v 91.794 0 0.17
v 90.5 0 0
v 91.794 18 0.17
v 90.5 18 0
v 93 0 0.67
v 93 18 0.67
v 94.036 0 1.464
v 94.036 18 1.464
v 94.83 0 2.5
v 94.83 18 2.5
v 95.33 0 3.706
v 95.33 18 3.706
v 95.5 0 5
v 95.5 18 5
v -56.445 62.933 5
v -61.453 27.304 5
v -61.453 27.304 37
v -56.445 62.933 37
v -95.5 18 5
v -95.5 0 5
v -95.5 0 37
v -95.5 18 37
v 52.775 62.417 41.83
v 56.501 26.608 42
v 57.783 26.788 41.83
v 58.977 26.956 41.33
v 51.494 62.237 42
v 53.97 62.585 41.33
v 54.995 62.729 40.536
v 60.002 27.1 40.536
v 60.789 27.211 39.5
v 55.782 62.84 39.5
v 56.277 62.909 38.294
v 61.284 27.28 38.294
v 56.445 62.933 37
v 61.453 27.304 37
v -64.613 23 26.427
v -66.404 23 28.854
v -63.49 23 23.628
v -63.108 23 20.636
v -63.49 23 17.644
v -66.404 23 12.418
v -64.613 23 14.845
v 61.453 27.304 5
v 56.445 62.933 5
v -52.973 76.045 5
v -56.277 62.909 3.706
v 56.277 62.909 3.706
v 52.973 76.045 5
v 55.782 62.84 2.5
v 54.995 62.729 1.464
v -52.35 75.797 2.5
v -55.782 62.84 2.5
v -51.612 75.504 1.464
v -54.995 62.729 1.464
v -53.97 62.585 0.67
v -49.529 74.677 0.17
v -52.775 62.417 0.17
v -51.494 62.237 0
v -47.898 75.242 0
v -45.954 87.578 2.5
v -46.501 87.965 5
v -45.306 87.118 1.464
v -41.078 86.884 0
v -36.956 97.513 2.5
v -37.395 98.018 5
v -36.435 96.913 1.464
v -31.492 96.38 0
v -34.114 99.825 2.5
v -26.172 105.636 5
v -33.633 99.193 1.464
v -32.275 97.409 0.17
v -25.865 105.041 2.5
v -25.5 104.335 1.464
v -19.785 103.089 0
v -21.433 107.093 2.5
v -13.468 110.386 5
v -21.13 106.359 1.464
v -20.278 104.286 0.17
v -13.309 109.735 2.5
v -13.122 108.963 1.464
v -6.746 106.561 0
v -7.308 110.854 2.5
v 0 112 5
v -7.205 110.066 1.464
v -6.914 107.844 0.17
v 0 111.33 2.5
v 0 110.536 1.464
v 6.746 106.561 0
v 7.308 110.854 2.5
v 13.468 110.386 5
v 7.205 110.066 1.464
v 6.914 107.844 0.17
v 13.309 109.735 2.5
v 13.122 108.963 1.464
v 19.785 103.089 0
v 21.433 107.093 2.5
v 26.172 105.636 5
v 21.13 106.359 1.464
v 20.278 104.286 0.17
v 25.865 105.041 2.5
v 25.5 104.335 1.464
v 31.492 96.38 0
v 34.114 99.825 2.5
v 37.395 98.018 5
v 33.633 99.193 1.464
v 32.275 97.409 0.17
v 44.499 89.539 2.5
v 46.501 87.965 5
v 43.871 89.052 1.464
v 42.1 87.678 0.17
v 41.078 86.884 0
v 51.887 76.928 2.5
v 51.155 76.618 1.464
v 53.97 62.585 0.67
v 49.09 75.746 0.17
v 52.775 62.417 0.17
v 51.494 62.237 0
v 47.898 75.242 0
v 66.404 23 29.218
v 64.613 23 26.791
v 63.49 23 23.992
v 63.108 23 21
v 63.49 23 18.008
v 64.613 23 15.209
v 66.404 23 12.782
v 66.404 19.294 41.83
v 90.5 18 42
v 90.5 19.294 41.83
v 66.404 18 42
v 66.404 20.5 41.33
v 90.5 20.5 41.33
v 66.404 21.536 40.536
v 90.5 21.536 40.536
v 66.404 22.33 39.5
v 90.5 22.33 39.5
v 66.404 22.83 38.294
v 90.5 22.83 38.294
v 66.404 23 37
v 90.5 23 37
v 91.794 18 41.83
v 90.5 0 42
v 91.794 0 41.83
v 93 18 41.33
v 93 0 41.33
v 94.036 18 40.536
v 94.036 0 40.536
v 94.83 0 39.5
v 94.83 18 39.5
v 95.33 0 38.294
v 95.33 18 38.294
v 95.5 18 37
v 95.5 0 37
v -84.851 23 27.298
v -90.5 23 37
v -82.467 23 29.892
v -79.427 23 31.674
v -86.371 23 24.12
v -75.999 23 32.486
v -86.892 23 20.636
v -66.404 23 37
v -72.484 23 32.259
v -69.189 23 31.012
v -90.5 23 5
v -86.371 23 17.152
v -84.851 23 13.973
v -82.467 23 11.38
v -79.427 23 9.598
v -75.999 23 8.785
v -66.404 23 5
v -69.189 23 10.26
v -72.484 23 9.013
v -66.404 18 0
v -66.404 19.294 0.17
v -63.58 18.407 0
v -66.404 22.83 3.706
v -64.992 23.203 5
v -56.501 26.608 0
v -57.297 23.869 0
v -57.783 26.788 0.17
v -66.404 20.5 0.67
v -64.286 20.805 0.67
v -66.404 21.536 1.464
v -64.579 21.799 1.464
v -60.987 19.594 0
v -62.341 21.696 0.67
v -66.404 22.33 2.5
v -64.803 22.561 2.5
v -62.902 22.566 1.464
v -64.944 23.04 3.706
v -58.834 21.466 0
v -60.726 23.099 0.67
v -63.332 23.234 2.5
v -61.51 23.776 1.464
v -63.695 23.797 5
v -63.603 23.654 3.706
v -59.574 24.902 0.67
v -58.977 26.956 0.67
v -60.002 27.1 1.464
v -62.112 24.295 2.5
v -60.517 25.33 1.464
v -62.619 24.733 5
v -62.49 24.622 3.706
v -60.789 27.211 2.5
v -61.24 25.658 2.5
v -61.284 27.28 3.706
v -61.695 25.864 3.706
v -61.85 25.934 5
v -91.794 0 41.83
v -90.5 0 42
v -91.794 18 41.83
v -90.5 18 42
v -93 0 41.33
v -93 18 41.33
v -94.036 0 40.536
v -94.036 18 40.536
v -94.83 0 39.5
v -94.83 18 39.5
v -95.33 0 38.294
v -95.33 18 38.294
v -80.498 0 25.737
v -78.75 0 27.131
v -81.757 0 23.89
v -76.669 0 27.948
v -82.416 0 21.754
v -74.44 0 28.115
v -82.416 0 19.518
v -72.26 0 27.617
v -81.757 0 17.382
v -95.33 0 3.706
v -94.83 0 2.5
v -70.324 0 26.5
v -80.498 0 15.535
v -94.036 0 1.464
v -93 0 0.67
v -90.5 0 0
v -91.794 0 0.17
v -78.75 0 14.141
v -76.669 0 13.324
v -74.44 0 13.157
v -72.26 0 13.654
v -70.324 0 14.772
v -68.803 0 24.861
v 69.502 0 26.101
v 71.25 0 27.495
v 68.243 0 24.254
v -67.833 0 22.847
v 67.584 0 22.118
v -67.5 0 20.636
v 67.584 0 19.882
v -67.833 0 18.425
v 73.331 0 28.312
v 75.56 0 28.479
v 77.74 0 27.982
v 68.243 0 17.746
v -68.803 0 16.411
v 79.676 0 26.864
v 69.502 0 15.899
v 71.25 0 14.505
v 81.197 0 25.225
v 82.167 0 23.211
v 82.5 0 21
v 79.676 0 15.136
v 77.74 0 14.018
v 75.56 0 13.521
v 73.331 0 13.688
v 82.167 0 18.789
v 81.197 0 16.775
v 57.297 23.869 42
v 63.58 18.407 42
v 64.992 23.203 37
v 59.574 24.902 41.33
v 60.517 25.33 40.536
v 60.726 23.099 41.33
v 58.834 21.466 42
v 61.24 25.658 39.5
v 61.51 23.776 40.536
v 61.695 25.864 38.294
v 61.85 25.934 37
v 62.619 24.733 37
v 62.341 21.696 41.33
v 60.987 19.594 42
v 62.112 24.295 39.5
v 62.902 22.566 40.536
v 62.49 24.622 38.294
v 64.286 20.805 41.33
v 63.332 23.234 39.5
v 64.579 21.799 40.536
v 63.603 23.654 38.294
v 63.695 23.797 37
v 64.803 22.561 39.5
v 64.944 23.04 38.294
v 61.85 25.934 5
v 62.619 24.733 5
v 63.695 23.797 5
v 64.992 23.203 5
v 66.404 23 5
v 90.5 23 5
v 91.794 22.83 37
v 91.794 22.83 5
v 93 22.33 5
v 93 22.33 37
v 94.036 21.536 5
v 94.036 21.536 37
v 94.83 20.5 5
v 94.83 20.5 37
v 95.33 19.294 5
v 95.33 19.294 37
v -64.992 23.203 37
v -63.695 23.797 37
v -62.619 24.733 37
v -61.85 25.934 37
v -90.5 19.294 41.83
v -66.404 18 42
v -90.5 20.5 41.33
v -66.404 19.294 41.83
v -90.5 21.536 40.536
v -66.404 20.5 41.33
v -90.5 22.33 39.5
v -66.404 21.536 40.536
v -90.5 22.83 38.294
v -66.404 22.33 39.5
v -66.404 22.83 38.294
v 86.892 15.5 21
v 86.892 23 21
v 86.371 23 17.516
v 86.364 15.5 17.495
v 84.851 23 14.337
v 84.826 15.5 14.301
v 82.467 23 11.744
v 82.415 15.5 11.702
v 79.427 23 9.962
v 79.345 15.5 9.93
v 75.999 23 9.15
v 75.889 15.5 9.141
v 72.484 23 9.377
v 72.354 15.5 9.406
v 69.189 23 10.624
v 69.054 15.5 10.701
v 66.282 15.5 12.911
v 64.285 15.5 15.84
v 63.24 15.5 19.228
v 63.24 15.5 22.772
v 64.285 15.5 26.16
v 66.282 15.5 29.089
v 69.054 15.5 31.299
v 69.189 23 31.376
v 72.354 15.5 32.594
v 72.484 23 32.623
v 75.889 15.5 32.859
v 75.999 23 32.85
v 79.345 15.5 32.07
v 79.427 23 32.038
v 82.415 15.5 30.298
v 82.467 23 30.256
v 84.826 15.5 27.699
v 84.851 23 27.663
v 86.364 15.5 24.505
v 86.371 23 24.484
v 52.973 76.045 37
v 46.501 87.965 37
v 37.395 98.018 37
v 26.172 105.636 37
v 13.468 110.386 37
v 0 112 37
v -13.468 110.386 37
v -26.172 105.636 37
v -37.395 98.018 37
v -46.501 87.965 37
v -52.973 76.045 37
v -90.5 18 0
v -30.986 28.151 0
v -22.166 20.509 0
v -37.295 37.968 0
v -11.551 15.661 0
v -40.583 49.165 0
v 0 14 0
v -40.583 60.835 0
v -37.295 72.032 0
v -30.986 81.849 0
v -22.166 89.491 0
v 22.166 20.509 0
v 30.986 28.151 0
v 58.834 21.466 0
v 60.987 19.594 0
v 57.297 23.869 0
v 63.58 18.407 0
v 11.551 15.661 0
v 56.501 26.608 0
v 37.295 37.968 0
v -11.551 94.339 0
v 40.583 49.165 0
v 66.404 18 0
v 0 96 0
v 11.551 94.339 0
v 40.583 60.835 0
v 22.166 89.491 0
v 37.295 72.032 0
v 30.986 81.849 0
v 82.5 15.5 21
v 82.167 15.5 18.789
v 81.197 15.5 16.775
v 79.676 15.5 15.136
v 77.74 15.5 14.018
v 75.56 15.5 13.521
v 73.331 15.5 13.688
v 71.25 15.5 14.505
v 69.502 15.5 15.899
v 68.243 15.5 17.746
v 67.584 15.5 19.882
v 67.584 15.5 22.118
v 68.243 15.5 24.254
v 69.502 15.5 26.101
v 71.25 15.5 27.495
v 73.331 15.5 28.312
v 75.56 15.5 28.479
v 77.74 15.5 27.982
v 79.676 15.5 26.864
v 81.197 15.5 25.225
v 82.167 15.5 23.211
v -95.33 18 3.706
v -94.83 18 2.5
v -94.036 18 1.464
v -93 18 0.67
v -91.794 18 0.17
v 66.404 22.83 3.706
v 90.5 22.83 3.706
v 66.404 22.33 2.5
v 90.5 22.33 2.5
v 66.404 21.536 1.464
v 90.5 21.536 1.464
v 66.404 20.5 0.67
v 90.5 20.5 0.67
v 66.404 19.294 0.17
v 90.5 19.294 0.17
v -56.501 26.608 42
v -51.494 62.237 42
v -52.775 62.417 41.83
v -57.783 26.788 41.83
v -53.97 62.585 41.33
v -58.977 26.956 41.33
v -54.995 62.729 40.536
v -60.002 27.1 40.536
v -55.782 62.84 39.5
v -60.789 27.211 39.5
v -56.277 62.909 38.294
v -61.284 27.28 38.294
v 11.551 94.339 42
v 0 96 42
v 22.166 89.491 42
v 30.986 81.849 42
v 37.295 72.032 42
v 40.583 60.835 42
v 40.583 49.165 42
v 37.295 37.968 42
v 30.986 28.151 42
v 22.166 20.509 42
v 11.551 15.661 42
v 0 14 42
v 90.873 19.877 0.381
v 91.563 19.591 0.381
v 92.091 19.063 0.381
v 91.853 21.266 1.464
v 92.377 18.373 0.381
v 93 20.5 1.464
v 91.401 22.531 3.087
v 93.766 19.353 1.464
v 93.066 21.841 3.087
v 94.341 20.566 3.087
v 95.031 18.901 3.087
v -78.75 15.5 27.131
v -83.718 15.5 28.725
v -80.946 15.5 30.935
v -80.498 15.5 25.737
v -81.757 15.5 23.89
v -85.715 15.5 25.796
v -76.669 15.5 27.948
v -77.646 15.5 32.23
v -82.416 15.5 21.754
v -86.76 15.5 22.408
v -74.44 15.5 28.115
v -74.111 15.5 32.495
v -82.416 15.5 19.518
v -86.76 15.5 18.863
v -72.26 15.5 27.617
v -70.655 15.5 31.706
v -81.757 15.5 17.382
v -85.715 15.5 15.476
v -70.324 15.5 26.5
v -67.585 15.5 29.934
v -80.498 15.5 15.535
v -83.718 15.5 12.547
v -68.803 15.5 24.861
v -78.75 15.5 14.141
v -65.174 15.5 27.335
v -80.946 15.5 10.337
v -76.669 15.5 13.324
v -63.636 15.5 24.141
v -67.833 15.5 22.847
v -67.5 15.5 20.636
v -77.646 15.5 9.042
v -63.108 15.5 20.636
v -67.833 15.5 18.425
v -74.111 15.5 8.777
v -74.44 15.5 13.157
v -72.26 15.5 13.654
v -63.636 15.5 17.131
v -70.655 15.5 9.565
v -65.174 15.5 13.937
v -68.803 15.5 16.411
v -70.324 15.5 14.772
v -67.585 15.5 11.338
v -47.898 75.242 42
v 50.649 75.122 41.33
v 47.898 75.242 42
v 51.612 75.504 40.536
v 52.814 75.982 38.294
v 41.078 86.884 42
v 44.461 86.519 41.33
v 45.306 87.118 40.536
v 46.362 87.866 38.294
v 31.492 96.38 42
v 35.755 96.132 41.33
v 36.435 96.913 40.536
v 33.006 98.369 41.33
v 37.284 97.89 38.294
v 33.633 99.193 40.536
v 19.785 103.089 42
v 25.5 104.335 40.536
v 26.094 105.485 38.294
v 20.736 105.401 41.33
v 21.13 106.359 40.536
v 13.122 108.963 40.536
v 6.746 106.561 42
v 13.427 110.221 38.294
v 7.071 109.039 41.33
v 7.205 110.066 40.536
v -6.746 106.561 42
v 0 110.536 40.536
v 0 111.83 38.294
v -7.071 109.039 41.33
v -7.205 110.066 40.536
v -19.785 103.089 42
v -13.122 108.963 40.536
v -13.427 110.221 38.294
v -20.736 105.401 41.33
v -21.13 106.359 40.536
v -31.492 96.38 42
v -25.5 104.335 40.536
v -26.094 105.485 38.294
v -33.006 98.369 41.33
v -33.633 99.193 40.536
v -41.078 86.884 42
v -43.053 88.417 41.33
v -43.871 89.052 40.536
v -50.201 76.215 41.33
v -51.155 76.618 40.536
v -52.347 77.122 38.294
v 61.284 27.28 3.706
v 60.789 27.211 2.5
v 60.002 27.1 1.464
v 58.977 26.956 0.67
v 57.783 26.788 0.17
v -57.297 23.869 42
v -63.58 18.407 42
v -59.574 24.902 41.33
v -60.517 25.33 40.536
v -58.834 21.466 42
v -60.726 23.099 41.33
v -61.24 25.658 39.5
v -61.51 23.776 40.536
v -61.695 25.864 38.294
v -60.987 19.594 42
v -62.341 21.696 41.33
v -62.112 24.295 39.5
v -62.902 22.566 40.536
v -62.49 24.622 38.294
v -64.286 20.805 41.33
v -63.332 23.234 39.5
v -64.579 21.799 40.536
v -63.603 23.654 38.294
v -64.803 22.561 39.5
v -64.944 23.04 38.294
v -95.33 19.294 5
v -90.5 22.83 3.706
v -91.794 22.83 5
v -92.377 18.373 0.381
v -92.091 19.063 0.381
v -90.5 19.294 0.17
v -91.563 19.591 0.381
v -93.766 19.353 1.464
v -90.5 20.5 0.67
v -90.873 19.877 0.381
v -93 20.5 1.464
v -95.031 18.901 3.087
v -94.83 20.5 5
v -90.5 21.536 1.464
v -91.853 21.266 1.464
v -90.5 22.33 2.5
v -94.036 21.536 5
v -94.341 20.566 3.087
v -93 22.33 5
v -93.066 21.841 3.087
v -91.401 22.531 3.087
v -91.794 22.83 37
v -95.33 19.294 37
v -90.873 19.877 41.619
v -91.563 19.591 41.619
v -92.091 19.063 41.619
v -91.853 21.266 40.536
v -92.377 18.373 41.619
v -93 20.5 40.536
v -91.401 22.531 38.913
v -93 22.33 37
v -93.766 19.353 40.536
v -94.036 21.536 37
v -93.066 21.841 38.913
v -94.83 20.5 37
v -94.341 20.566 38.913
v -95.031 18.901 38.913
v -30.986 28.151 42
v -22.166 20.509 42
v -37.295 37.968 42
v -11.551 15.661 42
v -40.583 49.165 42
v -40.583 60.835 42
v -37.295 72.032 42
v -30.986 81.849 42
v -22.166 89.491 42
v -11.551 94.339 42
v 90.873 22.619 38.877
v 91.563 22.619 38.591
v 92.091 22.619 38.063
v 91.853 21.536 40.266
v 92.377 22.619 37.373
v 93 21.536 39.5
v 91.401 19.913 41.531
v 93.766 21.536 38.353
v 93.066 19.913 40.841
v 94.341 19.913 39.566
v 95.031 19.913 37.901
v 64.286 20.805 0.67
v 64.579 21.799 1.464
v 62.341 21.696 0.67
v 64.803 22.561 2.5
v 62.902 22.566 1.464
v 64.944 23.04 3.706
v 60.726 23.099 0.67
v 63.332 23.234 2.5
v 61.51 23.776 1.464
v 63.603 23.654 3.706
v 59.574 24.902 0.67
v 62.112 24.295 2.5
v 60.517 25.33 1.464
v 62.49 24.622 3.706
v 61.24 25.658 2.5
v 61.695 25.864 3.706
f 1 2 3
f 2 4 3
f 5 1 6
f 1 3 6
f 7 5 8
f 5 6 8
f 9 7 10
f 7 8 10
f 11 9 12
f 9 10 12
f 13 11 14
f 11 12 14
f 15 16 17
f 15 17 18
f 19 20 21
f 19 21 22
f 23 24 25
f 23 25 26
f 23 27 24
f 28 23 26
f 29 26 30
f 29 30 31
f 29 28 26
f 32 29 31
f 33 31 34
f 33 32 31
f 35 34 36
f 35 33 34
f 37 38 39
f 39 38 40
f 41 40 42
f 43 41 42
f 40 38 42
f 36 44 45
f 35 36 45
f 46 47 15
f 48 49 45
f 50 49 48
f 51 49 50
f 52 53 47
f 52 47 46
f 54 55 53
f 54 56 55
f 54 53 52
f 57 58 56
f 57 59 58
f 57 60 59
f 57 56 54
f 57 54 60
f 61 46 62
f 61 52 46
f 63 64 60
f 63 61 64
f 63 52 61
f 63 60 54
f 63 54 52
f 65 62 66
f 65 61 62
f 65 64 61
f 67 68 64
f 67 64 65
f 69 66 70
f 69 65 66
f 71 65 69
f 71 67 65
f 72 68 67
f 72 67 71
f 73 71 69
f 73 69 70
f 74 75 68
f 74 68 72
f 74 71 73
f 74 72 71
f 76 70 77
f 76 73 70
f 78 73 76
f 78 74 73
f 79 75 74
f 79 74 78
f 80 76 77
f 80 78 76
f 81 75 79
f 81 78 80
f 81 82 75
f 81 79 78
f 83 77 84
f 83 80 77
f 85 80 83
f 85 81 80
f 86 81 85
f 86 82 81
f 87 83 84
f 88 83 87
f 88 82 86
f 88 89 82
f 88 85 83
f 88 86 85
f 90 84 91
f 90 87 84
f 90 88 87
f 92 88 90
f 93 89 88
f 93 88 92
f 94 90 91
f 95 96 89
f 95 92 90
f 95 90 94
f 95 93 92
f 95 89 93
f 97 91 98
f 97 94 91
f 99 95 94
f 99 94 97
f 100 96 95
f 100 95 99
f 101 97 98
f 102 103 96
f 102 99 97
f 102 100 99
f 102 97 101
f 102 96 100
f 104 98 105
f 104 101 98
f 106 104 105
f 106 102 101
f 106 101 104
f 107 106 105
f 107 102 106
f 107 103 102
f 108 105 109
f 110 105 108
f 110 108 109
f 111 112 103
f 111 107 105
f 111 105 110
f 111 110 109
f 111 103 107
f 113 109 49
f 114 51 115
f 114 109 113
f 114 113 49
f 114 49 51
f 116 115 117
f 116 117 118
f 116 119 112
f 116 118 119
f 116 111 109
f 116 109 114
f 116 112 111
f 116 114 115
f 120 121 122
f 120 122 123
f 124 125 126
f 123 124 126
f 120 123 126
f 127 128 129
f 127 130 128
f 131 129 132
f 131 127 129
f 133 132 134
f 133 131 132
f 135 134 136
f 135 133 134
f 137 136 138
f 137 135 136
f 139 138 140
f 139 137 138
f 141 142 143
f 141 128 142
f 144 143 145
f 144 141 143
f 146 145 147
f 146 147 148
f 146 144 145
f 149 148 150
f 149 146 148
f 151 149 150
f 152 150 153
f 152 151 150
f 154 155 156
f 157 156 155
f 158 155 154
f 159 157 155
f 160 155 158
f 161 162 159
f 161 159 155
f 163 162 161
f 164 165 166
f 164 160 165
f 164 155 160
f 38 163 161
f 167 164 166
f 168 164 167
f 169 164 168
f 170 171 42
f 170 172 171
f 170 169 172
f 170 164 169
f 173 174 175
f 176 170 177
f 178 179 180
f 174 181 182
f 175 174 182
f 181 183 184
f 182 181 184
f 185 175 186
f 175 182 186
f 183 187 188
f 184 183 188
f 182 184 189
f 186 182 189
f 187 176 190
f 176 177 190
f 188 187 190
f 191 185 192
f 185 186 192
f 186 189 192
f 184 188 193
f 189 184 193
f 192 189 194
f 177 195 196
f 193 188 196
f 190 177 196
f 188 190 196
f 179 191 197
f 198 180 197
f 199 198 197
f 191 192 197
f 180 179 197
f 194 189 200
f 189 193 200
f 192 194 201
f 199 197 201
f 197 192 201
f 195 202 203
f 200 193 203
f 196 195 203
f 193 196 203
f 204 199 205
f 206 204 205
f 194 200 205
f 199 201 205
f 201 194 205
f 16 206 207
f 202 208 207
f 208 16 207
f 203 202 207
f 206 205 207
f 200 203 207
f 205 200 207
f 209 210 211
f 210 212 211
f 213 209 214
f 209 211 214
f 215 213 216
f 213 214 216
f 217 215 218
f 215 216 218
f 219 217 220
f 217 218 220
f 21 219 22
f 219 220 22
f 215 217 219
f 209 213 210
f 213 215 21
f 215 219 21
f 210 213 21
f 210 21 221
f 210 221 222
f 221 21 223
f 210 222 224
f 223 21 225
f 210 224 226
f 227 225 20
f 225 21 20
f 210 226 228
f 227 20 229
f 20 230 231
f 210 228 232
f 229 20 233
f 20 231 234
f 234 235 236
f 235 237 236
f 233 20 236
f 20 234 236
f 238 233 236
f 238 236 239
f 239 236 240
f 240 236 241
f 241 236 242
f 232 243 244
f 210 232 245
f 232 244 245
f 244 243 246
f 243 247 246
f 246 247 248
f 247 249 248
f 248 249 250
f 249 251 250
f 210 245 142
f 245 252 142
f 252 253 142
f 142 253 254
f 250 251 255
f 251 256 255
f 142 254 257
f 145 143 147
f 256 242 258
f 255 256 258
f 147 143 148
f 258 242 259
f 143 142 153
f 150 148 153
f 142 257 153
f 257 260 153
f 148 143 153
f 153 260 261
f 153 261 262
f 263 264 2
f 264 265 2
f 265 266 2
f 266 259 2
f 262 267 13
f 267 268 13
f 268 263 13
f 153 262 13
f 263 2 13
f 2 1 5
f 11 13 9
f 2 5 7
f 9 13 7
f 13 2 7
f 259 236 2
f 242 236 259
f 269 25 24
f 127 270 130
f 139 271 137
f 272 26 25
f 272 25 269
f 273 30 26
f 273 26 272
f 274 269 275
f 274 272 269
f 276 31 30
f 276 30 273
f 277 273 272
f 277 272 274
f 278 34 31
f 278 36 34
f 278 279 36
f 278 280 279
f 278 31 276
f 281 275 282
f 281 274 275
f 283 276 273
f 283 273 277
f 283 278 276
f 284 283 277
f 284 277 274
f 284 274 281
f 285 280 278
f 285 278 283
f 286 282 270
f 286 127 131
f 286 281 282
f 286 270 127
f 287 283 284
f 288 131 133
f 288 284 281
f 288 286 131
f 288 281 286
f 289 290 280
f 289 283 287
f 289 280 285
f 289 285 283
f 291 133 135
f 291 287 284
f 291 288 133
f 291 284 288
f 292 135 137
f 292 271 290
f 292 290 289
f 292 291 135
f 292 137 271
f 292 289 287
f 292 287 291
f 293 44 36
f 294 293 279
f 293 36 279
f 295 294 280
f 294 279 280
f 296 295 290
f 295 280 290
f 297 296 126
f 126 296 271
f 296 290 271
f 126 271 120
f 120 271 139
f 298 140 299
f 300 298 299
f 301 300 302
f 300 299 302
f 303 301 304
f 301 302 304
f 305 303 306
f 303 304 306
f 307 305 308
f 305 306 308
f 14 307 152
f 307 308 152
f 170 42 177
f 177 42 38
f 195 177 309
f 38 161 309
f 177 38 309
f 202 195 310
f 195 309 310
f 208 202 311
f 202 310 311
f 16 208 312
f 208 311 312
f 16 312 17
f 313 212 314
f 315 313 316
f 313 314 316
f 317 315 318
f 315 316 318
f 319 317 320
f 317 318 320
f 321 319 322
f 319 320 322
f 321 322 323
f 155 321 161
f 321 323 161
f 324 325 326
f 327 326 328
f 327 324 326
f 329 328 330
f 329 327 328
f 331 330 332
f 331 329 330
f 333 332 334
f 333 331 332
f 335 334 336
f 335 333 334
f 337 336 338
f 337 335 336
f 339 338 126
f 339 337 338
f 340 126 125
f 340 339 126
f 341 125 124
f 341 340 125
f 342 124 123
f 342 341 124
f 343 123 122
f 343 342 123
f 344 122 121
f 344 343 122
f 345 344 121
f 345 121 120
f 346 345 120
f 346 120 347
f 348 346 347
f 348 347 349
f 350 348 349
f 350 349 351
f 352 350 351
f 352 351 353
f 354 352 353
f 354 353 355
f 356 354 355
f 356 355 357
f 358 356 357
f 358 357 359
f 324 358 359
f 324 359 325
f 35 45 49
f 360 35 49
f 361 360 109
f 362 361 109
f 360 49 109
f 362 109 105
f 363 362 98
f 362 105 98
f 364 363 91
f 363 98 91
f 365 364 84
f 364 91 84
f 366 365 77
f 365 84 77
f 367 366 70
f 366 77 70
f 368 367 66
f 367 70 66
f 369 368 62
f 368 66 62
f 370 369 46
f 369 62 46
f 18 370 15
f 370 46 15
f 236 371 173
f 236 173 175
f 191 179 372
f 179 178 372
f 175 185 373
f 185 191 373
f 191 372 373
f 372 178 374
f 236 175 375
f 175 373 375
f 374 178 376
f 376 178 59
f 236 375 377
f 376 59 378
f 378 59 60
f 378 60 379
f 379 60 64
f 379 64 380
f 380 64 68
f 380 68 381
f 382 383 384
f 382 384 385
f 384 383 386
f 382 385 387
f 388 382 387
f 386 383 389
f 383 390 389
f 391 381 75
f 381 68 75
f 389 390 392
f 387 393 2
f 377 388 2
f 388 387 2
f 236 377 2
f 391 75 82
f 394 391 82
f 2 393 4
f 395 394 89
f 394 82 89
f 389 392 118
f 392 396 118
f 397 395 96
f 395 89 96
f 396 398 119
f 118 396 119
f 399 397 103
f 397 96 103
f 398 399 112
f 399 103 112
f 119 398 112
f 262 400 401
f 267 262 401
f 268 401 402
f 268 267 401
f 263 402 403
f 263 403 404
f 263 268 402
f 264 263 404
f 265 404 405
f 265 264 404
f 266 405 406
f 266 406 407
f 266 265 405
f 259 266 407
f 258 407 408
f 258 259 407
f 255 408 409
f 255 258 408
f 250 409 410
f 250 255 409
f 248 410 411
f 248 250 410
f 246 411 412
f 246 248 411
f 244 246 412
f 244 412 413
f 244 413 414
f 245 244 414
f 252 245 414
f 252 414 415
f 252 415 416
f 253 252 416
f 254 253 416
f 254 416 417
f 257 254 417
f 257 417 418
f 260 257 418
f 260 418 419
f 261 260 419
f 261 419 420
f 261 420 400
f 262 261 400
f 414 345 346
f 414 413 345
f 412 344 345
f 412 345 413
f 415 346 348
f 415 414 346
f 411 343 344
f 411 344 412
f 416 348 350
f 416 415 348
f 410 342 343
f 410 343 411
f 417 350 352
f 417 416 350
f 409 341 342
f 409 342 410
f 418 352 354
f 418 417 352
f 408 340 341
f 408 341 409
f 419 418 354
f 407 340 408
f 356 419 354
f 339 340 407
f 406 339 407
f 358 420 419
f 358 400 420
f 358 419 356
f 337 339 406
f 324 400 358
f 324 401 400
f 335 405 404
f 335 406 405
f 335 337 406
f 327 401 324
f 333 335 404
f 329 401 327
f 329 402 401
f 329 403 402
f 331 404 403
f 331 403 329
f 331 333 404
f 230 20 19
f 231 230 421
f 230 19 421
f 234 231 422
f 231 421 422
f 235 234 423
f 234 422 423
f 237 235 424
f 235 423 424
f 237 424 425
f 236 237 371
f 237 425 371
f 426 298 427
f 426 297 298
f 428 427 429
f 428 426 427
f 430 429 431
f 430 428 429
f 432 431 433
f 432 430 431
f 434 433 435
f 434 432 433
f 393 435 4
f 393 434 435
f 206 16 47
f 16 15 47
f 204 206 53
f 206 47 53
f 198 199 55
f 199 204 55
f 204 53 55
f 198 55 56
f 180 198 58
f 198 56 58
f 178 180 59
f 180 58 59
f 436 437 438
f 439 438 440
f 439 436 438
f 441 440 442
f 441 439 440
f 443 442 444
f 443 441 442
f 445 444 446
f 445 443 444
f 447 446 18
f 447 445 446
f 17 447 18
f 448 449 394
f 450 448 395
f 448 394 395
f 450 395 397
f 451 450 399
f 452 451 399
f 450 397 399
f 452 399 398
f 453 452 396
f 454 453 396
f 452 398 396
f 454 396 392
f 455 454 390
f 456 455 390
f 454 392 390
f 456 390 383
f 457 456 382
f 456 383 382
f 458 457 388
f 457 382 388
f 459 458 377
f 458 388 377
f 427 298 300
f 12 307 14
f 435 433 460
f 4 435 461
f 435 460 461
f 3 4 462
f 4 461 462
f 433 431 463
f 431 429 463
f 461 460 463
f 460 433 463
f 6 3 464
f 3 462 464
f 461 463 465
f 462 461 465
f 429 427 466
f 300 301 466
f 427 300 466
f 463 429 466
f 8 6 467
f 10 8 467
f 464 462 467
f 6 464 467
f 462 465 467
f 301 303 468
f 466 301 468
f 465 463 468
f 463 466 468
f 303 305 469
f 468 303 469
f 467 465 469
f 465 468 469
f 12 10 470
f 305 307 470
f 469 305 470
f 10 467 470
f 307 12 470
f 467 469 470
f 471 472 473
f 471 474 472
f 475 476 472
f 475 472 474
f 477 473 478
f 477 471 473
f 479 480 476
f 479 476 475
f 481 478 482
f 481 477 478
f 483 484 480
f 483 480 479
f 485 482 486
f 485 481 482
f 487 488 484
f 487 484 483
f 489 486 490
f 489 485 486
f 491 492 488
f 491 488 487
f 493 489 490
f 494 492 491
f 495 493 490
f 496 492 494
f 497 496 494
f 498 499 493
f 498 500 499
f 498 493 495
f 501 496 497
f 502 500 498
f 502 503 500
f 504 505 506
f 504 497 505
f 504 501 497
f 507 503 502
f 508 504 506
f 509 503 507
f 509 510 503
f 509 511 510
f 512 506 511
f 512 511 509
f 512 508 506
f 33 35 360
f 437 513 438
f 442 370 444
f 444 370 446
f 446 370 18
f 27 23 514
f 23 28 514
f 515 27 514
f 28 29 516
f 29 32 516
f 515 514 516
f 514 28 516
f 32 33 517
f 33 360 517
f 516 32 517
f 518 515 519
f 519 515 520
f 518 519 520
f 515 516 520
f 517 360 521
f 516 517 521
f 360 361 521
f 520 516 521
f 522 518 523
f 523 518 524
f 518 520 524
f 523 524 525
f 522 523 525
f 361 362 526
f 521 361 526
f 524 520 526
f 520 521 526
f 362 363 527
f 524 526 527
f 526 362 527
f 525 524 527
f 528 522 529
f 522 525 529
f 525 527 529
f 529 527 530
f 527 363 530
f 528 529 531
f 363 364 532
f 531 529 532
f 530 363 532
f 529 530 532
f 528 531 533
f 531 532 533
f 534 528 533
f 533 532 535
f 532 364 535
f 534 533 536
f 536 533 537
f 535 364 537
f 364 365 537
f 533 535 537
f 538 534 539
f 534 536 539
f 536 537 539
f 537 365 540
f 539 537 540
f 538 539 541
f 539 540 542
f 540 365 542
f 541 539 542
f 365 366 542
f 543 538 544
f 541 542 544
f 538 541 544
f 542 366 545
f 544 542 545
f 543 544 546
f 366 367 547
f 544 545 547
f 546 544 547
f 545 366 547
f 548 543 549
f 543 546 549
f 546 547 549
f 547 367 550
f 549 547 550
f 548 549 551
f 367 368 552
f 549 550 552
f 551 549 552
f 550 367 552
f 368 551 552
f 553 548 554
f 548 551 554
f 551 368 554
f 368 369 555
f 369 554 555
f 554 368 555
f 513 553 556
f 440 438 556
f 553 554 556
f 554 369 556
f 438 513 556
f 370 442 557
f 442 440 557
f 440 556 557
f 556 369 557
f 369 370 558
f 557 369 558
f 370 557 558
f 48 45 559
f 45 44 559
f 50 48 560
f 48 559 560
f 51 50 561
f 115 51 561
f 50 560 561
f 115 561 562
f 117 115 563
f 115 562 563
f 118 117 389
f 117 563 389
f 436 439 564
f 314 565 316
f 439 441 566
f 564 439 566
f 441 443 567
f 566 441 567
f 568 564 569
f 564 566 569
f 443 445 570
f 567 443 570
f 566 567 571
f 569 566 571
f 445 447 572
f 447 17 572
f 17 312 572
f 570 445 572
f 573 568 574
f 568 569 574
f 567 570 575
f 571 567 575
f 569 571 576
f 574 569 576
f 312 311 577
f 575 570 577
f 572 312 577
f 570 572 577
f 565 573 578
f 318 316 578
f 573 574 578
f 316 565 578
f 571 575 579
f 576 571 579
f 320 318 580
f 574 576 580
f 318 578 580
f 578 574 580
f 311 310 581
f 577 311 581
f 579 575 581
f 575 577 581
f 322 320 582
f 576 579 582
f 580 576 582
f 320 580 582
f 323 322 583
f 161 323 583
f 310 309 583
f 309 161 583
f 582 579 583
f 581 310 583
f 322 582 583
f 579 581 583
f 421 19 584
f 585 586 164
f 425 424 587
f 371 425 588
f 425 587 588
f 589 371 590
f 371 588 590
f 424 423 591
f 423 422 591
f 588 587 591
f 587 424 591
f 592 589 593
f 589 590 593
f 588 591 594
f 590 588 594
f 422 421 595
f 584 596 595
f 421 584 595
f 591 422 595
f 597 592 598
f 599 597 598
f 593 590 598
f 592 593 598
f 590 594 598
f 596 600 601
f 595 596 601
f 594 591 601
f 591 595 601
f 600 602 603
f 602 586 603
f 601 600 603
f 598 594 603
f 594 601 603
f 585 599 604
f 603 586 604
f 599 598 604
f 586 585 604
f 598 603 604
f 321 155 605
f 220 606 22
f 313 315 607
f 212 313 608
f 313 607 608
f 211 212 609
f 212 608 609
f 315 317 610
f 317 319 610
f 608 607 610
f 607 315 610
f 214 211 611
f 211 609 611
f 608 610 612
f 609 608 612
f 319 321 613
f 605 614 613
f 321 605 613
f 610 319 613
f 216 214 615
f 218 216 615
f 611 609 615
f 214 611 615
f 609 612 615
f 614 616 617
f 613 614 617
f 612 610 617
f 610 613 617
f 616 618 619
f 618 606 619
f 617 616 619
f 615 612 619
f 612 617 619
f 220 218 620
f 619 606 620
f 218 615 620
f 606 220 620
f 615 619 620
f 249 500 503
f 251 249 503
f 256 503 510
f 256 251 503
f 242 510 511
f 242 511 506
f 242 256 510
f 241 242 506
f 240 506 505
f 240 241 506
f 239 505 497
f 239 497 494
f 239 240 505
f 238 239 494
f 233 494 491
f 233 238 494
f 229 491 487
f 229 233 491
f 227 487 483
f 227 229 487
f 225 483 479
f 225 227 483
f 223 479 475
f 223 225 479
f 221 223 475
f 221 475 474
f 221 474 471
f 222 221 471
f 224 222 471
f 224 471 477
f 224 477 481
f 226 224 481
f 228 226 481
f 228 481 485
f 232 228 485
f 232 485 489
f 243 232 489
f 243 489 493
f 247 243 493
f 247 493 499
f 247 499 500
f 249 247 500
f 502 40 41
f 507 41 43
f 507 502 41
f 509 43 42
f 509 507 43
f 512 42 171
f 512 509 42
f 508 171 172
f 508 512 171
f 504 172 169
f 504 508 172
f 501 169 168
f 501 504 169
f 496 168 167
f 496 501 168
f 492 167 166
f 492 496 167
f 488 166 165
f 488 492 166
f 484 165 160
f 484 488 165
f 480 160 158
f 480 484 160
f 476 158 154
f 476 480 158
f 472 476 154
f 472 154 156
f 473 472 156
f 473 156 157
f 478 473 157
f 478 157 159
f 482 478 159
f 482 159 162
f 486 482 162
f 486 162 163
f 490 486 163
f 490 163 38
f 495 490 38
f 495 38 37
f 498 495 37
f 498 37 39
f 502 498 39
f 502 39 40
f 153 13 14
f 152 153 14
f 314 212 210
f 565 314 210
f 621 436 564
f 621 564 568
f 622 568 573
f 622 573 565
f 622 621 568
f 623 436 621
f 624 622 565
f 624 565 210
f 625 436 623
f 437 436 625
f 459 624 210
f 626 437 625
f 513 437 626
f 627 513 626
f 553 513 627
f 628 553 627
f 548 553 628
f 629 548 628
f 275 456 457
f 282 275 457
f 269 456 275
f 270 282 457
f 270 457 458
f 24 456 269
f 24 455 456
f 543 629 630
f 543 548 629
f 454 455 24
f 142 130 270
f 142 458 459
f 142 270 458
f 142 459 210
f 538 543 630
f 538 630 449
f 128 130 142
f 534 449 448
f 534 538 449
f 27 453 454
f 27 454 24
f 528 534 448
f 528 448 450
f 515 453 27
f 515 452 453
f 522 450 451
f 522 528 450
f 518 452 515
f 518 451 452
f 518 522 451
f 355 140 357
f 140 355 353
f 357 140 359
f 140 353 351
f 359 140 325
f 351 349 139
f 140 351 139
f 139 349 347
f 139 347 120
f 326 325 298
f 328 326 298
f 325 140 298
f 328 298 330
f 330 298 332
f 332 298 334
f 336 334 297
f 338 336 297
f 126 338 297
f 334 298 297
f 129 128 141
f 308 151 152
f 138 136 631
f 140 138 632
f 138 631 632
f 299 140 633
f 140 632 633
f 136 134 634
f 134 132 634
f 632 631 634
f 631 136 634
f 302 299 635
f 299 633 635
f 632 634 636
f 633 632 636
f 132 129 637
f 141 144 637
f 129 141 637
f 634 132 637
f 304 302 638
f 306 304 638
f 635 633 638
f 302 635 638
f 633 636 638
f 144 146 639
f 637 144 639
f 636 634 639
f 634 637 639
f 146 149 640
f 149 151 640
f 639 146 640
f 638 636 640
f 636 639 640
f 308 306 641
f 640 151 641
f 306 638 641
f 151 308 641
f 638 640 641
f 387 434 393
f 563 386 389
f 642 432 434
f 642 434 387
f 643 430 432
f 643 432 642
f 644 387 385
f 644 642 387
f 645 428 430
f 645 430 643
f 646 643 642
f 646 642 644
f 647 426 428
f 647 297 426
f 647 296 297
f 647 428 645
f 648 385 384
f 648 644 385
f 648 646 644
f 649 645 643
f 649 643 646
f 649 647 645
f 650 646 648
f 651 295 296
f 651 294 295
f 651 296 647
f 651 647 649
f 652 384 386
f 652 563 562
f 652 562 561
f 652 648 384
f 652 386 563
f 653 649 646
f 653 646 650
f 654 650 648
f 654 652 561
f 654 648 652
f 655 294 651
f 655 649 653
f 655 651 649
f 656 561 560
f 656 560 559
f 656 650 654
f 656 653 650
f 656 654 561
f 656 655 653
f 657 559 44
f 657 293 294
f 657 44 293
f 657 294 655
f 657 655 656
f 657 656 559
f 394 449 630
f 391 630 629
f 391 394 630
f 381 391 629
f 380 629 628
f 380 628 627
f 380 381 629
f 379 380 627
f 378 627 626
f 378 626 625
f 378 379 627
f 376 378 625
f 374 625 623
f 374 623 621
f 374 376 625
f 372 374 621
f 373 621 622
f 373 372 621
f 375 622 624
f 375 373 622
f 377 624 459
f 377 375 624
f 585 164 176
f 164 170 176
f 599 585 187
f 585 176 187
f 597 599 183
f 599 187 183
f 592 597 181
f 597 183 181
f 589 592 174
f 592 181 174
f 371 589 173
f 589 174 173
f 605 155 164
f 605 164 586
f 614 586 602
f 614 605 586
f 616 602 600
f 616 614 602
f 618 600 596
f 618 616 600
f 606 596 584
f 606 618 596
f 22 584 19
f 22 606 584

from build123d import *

# Parameters (mm, degrees)
BOSS_EXTRUDE1_DEPTH                        = 42
FILLET1_R                                  = 5
CBORE_FOR_M12_HEX_HEAD_BOLT2_OUTLINE_R     = 7.5
CBORE_FOR_M12_HEX_HEAD_BOLT2_DEPTH         = 23
CBORE_START                                = 15.5
CBORE_FOR_M12_HEX_HEAD_BOLT2_2_OUTLINE_R   = 11.8925
CBORE_FOR_M12_HEX_HEAD_BOLT2_2_OUTLINE_R_2 = 7.5
CBORE_FOR_M12_HEX_HEAD_BOLT2_2_DEPTH       = 7.5


# Read off the part's stored shape, not the designer's step: CBORE for M12 Hex Head Bolt2
with BuildPart() as part:
    # Sketch1 → Boss-Extrude1 (new body)
    with BuildSketch(Plane.XY):
        with BuildLine():
            Line((0, 0), (-95.5, 0))
            Line((-95.5, 0), (-95.5, 23))
            Line((-95.5, 23), (-62.057478344, 23))
            Line((-62.057478344, 23), (-56.445279918, 62.932866755))
            ThreePointArc((-56.445279918, 62.932866755), (-37.395364652, 98.018446073), (0, 112))
            Line((0, 112), (0, 96))
            ThreePointArc((0, 96), (-41, 55), (0, 14))
            Line((0, 14), (0, 0))
        make_face()
    boss_extrude1 = extrude(amount=BOSS_EXTRUDE1_DEPTH)

    # Mirror1: Boss-Extrude1 across plane
    add(boss_extrude1.mirror(Plane(origin=(0, 112, 42), x_dir=(0, 0, 1), z_dir=(-1, 0, 0))))

    # Fillet1
    fillet1_edges = [part.edges().sort_by_distance(p)[0] for p in [
        (0, 112, 0),
        (-95.5, 23, 21),
        (-62.057478344, 23, 21),
        (0, 112, 42),
        (-59.251379131, 42.966433377, 42),
        (95.5, 11.5, 42),
        (-78.778739172, 23, 42),
        (78.778739172, 23, 42),
        (95.5, 23, 21),
        (59.251379131, 42.966433377, 42),
        (62.057478344, 23, 21),
        (59.251379131, 42.966433377, 0),
        (78.778739172, 23, 0),
        (-95.5, 11.5, 42),
        (95.5, 11.5, 0),
        (-95.5, 11.5, 0),
        (-78.778739172, 23, 0),
        (-59.251379131, 42.966433377, 0),
    ]]
    fillet(fillet1_edges, radius=FILLET1_R)

    # CBORE for M12 Hex Head Bolt2 outline → CBORE for M12 Hex Head Bolt2 (cut)
    with BuildSketch(Plane(origin=(0, 0, 0), x_dir=(1, 0, 0), z_dir=(0, 1, 0))):
        with Locations((75, -21)):
            Circle(CBORE_FOR_M12_HEX_HEAD_BOLT2_OUTLINE_R)
        with Locations((-75, -20.635902385)):
            Circle(CBORE_FOR_M12_HEX_HEAD_BOLT2_OUTLINE_R)
    extrude(amount=CBORE_FOR_M12_HEX_HEAD_BOLT2_DEPTH, mode=Mode.SUBTRACT)

    # CBORE for M12 Hex Head Bolt2 2 outline → CBORE for M12 Hex Head Bolt2 2 (cut)
    # profile 1 of 2: a face of its own
    with BuildSketch(Plane(origin=(0, 0, 0), x_dir=(1, 0, 0), z_dir=(0, 1, 0)).offset(CBORE_START)):
        with Locations((75, -21)):
            Circle(CBORE_FOR_M12_HEX_HEAD_BOLT2_2_OUTLINE_R)
        with Locations((75, -21)):
            Circle(CBORE_FOR_M12_HEX_HEAD_BOLT2_2_OUTLINE_R_2, mode=Mode.SUBTRACT)
    # profile 2 of 2: a face of its own
    with BuildSketch(Plane(origin=(0, 0, 0), x_dir=(1, 0, 0), z_dir=(0, 1, 0)).offset(CBORE_START)):
        with Locations((-75, -20.635902385)):
            Circle(CBORE_FOR_M12_HEX_HEAD_BOLT2_2_OUTLINE_R)
        with Locations((-75, -20.635902385)):
            Circle(CBORE_FOR_M12_HEX_HEAD_BOLT2_2_OUTLINE_R_2, mode=Mode.SUBTRACT)
    extrude(amount=CBORE_FOR_M12_HEX_HEAD_BOLT2_2_DEPTH, mode=Mode.SUBTRACT)


solid = part.part
